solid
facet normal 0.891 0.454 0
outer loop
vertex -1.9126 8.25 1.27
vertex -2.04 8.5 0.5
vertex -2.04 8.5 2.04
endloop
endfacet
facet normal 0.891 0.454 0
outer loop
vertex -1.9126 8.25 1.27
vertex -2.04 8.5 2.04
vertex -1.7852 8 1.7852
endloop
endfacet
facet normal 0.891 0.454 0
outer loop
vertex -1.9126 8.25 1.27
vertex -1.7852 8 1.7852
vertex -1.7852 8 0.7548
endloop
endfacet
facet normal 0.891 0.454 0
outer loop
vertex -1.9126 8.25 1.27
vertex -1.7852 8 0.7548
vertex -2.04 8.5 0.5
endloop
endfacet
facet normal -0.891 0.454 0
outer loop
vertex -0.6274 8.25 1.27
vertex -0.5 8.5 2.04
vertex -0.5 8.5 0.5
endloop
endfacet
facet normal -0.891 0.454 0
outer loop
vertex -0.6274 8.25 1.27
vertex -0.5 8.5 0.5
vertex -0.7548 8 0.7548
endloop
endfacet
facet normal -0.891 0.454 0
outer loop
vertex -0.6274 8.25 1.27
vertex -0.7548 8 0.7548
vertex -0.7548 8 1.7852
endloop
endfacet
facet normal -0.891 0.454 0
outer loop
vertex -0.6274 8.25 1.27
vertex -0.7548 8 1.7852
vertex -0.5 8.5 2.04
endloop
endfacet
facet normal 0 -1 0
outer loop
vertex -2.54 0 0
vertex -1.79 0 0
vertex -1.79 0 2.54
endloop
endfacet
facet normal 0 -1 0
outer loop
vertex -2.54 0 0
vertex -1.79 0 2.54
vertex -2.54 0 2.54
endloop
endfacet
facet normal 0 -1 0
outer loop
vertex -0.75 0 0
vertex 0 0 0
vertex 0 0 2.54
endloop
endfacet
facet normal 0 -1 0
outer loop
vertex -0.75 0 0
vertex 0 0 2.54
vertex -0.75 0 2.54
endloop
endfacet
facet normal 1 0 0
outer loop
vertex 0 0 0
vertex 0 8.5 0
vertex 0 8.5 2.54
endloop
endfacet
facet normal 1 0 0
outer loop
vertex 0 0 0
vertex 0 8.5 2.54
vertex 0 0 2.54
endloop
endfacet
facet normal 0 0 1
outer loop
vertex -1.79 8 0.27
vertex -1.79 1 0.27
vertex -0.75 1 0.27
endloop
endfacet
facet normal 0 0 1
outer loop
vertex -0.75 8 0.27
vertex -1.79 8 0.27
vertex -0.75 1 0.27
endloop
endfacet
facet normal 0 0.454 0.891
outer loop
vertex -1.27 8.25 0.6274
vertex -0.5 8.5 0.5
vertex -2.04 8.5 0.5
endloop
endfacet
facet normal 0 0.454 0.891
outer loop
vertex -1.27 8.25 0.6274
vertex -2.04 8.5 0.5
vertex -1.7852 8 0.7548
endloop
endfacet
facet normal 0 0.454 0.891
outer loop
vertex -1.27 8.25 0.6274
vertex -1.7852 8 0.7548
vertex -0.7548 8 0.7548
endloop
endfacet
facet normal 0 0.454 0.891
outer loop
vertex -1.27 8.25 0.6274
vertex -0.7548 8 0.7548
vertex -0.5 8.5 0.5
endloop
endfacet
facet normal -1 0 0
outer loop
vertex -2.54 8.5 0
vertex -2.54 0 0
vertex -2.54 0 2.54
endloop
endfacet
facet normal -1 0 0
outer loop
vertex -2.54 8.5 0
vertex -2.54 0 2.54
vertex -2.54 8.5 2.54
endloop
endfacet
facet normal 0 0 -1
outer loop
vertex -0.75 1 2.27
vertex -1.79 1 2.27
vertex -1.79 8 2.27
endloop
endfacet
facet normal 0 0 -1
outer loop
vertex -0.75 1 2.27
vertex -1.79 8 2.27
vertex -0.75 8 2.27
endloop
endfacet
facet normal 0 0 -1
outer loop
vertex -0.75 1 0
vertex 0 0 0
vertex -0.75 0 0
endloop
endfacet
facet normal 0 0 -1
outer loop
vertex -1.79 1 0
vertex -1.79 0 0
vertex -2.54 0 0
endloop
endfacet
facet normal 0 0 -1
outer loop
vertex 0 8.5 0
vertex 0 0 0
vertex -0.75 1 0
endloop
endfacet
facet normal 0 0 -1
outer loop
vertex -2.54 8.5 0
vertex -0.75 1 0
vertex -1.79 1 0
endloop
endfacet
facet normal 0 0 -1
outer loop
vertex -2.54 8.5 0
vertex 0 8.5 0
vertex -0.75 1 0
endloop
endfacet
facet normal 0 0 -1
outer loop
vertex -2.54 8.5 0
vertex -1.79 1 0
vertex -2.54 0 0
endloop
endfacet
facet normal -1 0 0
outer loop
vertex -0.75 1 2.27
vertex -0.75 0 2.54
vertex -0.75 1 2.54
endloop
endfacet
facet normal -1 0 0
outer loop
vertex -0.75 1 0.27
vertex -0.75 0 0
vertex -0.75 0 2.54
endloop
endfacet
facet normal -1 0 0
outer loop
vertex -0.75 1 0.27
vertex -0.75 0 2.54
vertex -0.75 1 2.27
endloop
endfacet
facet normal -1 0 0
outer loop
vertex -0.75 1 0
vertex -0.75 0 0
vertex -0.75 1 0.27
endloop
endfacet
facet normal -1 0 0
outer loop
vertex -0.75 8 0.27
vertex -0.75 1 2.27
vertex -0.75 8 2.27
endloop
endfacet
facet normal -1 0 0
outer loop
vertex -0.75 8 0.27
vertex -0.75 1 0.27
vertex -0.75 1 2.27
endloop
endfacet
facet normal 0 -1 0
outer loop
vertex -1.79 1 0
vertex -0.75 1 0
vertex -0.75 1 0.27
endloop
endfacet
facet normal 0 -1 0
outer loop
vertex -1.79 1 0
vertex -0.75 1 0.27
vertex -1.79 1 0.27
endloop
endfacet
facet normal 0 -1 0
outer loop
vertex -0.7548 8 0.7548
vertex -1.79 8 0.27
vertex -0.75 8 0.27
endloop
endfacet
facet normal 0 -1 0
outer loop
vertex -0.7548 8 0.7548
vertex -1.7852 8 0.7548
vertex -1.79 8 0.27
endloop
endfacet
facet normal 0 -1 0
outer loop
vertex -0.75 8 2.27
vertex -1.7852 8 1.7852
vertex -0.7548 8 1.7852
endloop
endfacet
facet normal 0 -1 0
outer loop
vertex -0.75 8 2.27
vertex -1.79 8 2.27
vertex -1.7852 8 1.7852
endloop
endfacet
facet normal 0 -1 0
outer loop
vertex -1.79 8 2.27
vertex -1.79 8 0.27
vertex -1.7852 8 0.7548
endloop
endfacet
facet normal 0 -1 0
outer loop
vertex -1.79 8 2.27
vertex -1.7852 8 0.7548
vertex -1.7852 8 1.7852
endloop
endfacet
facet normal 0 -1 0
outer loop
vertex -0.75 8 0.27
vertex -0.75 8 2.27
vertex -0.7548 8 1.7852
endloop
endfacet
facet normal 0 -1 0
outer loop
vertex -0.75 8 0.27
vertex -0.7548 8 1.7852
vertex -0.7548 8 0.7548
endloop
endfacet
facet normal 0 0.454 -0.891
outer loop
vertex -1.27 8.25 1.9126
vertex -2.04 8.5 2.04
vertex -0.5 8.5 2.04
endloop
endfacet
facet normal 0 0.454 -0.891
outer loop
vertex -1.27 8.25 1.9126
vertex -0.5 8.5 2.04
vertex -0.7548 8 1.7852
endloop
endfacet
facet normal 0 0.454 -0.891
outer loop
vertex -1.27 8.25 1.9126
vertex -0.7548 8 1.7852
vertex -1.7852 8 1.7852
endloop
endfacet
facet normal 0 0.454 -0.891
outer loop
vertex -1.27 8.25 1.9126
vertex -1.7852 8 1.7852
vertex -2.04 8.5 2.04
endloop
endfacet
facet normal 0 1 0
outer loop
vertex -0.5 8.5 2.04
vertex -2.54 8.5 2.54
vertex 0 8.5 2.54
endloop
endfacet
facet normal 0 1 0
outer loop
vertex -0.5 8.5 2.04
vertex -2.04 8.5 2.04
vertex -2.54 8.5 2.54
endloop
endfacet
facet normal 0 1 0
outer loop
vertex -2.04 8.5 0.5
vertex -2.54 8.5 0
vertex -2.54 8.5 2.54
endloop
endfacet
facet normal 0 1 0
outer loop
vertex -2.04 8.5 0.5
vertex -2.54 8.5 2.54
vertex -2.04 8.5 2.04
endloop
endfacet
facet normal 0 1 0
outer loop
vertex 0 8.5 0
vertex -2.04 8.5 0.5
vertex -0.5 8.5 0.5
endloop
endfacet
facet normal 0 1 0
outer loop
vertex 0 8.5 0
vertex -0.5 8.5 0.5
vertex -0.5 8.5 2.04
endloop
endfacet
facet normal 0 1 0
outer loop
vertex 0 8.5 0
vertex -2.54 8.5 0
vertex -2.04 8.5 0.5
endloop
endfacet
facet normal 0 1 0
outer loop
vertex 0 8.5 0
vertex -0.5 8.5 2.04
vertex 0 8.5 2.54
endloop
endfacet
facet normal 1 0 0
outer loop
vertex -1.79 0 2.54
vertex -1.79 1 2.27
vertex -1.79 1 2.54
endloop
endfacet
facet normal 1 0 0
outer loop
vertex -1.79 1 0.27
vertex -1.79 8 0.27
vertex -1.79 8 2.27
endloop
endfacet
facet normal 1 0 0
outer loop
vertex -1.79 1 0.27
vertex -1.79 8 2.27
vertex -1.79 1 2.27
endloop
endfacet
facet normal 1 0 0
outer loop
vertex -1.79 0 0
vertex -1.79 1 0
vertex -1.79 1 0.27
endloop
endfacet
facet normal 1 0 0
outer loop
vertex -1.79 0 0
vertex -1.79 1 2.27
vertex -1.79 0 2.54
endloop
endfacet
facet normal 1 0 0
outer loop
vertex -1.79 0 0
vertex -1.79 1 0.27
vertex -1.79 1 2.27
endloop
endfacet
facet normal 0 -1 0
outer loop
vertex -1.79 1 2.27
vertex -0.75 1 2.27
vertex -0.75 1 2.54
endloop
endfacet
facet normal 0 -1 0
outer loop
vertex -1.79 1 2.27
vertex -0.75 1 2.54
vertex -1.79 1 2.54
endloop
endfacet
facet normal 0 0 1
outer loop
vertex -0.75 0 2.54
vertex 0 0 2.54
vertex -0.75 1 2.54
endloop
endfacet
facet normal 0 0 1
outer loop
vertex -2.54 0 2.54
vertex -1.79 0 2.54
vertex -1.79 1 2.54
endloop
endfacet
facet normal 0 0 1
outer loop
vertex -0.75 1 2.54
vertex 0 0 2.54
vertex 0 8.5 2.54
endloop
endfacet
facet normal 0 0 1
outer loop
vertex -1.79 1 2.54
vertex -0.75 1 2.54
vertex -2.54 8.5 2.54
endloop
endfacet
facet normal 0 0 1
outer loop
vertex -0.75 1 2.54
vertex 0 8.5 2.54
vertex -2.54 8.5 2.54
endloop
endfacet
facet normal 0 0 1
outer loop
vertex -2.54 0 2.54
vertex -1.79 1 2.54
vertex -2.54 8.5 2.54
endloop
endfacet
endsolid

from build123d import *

# Parameters (mm, degrees)
BOSS_EXTRUDE1_DEPTH = 2.54
SKETCH2_W           = 1.04
SKETCH2_H           = 2
CUT_EXTRUDE1_DEPTH  = 7
SKETCH3_W           = 1.54
SKETCH3_H           = 1.54
CUT_EXTRUDE2_DEPTH  = 0.5
CUT_EXTRUDE2_TAPER  = 27


with BuildPart() as part:
    # Sketch1 → Boss-Extrude1 (new body)
    with BuildSketch(Plane.XY):
        Polygon((-1.79, 0), (-2.54, 0), (-2.54, 8.5), (0, 8.5), (0, 0), (-0.75, 0), (-0.75, 1), (-1.79, 1), align=None)
    extrude(amount=BOSS_EXTRUDE1_DEPTH)

    # Sketch2 → Cut-Extrude1 (cut)
    with BuildSketch(Plane.XZ.offset(-1)):
        with Locations((-1.27, 1.27)):
            Rectangle(SKETCH2_W, SKETCH2_H)
    extrude(amount=-CUT_EXTRUDE1_DEPTH, mode=Mode.SUBTRACT)

    # Sketch3 → Cut-Extrude2 (cut)
    with BuildSketch(Plane(origin=(0, 8.5, 0), x_dir=(1, 0, 0), z_dir=(0, 1, 0))):
        with Locations((-1.27, -1.27)):
            Rectangle(SKETCH3_W, SKETCH3_H)
    extrude(amount=-CUT_EXTRUDE2_DEPTH, taper=CUT_EXTRUDE2_TAPER, mode=Mode.SUBTRACT)


solid = part.part
